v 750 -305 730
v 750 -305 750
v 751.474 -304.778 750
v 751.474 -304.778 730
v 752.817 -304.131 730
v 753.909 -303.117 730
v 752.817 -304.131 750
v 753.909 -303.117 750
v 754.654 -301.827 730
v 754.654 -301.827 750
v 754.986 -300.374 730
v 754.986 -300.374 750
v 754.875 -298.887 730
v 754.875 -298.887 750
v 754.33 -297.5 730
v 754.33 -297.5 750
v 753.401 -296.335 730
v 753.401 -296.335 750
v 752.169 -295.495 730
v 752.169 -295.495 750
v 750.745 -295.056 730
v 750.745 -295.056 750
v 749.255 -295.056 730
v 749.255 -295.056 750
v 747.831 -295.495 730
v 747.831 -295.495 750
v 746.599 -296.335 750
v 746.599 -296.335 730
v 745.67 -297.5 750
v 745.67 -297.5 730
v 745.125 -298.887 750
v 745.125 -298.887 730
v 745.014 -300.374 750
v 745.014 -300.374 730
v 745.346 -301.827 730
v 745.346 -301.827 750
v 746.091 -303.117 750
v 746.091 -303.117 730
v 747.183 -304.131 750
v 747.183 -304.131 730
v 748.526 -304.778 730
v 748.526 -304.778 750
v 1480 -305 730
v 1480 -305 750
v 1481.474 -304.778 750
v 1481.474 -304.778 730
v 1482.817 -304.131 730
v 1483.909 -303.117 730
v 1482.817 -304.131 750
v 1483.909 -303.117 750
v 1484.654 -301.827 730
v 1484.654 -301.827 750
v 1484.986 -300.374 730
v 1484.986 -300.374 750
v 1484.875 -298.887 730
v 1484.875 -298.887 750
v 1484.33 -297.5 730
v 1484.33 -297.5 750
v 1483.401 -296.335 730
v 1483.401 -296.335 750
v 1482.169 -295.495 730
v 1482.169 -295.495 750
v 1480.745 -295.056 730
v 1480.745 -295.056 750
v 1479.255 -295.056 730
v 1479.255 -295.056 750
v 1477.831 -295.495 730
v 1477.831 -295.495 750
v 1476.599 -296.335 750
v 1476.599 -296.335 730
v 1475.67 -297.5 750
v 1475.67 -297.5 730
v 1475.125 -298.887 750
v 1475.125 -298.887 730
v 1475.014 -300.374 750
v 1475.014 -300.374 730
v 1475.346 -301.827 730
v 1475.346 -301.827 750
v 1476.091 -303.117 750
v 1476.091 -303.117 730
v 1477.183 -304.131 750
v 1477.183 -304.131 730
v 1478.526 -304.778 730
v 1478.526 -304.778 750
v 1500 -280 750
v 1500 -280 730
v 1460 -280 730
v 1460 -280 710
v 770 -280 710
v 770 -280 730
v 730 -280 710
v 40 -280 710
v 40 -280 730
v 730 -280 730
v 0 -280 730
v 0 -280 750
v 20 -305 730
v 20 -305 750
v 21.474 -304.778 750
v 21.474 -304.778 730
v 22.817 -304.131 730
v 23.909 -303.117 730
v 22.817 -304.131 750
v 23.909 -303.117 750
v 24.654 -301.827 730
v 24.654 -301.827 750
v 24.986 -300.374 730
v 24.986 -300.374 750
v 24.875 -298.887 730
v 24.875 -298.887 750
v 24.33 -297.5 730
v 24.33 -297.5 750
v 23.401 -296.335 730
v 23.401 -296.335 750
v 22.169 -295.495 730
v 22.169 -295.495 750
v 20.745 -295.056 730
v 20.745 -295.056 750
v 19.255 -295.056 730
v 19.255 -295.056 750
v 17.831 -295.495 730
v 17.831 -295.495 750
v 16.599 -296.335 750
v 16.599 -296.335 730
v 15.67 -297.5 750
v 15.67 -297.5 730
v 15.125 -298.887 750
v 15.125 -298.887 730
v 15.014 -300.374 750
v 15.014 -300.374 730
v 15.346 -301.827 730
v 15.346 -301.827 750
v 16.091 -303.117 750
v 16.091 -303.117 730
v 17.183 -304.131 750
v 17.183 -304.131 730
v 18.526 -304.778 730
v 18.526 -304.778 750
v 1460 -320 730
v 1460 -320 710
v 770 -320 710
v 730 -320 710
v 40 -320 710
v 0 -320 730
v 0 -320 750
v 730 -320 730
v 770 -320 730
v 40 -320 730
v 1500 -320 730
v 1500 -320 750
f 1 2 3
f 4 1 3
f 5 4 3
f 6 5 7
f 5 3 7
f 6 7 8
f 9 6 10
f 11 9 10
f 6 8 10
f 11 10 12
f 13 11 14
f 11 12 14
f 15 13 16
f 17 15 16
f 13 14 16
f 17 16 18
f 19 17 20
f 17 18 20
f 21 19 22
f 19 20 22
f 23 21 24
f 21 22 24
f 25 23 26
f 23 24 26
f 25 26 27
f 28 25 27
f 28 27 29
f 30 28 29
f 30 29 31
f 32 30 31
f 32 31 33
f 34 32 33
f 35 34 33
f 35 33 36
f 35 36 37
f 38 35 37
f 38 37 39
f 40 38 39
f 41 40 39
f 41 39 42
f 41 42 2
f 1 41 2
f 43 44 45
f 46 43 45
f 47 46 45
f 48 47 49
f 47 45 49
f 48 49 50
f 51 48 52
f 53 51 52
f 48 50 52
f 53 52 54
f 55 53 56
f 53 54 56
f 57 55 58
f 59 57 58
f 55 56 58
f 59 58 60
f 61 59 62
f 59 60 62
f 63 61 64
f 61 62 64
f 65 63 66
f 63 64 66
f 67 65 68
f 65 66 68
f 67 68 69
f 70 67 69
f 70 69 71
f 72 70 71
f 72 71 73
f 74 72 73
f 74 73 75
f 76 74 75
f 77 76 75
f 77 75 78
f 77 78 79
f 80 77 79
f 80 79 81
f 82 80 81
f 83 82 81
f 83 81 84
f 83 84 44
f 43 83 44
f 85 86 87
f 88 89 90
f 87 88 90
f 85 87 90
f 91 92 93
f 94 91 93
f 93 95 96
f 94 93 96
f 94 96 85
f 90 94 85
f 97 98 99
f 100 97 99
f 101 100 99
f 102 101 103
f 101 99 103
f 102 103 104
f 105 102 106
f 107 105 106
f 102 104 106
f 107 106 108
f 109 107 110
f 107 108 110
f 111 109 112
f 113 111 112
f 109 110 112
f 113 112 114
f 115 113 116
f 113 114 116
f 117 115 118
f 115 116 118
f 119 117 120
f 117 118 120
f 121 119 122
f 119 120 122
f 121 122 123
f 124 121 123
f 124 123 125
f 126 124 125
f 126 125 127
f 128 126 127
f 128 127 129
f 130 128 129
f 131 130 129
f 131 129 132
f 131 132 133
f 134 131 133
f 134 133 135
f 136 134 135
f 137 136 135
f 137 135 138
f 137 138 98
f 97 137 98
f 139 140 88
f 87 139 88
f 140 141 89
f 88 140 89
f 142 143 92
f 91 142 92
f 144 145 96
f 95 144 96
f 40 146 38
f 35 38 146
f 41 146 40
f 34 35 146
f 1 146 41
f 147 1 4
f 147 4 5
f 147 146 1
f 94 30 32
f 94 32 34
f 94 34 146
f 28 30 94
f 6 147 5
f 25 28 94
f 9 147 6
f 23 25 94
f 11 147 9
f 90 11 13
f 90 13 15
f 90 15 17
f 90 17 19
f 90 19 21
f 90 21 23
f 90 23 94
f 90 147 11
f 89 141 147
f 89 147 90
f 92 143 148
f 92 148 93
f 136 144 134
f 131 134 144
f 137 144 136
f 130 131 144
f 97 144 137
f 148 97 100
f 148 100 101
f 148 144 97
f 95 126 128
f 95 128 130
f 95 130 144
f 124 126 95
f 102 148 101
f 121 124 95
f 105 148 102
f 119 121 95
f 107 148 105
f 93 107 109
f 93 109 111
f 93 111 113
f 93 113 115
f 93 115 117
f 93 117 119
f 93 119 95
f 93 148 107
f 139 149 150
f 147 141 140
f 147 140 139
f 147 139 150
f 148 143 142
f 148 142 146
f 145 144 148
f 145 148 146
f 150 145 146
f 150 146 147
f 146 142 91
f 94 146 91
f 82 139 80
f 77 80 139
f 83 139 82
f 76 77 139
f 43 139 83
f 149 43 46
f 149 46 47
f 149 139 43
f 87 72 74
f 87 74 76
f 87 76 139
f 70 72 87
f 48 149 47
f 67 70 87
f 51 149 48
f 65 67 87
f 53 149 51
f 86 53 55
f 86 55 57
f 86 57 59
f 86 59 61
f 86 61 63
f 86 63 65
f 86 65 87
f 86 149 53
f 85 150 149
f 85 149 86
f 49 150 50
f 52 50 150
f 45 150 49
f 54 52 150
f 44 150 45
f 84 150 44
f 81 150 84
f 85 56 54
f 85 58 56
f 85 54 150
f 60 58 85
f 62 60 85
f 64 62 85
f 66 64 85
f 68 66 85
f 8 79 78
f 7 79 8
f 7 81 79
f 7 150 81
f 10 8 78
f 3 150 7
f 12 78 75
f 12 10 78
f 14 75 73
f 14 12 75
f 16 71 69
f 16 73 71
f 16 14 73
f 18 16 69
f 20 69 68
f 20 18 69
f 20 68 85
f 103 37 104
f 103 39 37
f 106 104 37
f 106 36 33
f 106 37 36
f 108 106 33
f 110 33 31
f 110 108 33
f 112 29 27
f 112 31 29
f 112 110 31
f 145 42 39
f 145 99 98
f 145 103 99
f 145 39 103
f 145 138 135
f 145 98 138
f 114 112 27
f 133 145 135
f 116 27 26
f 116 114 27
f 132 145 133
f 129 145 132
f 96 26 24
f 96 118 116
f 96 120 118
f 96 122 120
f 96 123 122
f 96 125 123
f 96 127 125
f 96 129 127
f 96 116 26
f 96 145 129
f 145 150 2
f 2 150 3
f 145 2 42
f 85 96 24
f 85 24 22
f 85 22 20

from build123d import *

# Parameters (mm, degrees)
SKETCH030_W     = 40
SKETCH030_H     = 40
PAD022_DEPTH    = 1500
SKETCH031_W     = 40
SKETCH031_H     = 40
POCKET008_DEPTH = 20
SKETCH059_R     = 5
POCKET014_DEPTH = 40.001


with BuildPart() as part:
    # Sketch030 → Pad022 (new body)
    with BuildSketch(Plane.YZ):
        with Locations((-300, 280)):
            Rectangle(SKETCH030_W, SKETCH030_H)
    extrude(amount=PAD022_DEPTH)

    # Sketch031 (on Face3 of Pad022) → Pocket008 (cut)
    with BuildSketch(Plane.YX.offset(-260)):
        with Locations((-300, 1480)):
            Rectangle(SKETCH031_W, SKETCH031_H)
        with Locations((-300, 750)):
            Rectangle(SKETCH031_W, SKETCH031_H)
        with Locations((-300, 20)):
            Rectangle(SKETCH031_W, SKETCH031_H)
    extrude(amount=-POCKET008_DEPTH, mode=Mode.SUBTRACT)

    # Sketch059 → Pocket014 (cut, through all)
    with BuildSketch(Plane(origin=(0, 0, 300), x_dir=(0, -1, 0), z_dir=(0, 0, 1))):
        with Locations((300, 20)):
            Circle(SKETCH059_R)
        with Locations((300, 750)):
            Circle(SKETCH059_R)
        with Locations((300, 1480)):
            Circle(SKETCH059_R)
    extrude(amount=-POCKET014_DEPTH, mode=Mode.SUBTRACT)


with BuildPart() as part_1:
    # Clone010 placement: moved
    add(part.part.moved(Location((0, 0, 450))))


solid = part_1.part
